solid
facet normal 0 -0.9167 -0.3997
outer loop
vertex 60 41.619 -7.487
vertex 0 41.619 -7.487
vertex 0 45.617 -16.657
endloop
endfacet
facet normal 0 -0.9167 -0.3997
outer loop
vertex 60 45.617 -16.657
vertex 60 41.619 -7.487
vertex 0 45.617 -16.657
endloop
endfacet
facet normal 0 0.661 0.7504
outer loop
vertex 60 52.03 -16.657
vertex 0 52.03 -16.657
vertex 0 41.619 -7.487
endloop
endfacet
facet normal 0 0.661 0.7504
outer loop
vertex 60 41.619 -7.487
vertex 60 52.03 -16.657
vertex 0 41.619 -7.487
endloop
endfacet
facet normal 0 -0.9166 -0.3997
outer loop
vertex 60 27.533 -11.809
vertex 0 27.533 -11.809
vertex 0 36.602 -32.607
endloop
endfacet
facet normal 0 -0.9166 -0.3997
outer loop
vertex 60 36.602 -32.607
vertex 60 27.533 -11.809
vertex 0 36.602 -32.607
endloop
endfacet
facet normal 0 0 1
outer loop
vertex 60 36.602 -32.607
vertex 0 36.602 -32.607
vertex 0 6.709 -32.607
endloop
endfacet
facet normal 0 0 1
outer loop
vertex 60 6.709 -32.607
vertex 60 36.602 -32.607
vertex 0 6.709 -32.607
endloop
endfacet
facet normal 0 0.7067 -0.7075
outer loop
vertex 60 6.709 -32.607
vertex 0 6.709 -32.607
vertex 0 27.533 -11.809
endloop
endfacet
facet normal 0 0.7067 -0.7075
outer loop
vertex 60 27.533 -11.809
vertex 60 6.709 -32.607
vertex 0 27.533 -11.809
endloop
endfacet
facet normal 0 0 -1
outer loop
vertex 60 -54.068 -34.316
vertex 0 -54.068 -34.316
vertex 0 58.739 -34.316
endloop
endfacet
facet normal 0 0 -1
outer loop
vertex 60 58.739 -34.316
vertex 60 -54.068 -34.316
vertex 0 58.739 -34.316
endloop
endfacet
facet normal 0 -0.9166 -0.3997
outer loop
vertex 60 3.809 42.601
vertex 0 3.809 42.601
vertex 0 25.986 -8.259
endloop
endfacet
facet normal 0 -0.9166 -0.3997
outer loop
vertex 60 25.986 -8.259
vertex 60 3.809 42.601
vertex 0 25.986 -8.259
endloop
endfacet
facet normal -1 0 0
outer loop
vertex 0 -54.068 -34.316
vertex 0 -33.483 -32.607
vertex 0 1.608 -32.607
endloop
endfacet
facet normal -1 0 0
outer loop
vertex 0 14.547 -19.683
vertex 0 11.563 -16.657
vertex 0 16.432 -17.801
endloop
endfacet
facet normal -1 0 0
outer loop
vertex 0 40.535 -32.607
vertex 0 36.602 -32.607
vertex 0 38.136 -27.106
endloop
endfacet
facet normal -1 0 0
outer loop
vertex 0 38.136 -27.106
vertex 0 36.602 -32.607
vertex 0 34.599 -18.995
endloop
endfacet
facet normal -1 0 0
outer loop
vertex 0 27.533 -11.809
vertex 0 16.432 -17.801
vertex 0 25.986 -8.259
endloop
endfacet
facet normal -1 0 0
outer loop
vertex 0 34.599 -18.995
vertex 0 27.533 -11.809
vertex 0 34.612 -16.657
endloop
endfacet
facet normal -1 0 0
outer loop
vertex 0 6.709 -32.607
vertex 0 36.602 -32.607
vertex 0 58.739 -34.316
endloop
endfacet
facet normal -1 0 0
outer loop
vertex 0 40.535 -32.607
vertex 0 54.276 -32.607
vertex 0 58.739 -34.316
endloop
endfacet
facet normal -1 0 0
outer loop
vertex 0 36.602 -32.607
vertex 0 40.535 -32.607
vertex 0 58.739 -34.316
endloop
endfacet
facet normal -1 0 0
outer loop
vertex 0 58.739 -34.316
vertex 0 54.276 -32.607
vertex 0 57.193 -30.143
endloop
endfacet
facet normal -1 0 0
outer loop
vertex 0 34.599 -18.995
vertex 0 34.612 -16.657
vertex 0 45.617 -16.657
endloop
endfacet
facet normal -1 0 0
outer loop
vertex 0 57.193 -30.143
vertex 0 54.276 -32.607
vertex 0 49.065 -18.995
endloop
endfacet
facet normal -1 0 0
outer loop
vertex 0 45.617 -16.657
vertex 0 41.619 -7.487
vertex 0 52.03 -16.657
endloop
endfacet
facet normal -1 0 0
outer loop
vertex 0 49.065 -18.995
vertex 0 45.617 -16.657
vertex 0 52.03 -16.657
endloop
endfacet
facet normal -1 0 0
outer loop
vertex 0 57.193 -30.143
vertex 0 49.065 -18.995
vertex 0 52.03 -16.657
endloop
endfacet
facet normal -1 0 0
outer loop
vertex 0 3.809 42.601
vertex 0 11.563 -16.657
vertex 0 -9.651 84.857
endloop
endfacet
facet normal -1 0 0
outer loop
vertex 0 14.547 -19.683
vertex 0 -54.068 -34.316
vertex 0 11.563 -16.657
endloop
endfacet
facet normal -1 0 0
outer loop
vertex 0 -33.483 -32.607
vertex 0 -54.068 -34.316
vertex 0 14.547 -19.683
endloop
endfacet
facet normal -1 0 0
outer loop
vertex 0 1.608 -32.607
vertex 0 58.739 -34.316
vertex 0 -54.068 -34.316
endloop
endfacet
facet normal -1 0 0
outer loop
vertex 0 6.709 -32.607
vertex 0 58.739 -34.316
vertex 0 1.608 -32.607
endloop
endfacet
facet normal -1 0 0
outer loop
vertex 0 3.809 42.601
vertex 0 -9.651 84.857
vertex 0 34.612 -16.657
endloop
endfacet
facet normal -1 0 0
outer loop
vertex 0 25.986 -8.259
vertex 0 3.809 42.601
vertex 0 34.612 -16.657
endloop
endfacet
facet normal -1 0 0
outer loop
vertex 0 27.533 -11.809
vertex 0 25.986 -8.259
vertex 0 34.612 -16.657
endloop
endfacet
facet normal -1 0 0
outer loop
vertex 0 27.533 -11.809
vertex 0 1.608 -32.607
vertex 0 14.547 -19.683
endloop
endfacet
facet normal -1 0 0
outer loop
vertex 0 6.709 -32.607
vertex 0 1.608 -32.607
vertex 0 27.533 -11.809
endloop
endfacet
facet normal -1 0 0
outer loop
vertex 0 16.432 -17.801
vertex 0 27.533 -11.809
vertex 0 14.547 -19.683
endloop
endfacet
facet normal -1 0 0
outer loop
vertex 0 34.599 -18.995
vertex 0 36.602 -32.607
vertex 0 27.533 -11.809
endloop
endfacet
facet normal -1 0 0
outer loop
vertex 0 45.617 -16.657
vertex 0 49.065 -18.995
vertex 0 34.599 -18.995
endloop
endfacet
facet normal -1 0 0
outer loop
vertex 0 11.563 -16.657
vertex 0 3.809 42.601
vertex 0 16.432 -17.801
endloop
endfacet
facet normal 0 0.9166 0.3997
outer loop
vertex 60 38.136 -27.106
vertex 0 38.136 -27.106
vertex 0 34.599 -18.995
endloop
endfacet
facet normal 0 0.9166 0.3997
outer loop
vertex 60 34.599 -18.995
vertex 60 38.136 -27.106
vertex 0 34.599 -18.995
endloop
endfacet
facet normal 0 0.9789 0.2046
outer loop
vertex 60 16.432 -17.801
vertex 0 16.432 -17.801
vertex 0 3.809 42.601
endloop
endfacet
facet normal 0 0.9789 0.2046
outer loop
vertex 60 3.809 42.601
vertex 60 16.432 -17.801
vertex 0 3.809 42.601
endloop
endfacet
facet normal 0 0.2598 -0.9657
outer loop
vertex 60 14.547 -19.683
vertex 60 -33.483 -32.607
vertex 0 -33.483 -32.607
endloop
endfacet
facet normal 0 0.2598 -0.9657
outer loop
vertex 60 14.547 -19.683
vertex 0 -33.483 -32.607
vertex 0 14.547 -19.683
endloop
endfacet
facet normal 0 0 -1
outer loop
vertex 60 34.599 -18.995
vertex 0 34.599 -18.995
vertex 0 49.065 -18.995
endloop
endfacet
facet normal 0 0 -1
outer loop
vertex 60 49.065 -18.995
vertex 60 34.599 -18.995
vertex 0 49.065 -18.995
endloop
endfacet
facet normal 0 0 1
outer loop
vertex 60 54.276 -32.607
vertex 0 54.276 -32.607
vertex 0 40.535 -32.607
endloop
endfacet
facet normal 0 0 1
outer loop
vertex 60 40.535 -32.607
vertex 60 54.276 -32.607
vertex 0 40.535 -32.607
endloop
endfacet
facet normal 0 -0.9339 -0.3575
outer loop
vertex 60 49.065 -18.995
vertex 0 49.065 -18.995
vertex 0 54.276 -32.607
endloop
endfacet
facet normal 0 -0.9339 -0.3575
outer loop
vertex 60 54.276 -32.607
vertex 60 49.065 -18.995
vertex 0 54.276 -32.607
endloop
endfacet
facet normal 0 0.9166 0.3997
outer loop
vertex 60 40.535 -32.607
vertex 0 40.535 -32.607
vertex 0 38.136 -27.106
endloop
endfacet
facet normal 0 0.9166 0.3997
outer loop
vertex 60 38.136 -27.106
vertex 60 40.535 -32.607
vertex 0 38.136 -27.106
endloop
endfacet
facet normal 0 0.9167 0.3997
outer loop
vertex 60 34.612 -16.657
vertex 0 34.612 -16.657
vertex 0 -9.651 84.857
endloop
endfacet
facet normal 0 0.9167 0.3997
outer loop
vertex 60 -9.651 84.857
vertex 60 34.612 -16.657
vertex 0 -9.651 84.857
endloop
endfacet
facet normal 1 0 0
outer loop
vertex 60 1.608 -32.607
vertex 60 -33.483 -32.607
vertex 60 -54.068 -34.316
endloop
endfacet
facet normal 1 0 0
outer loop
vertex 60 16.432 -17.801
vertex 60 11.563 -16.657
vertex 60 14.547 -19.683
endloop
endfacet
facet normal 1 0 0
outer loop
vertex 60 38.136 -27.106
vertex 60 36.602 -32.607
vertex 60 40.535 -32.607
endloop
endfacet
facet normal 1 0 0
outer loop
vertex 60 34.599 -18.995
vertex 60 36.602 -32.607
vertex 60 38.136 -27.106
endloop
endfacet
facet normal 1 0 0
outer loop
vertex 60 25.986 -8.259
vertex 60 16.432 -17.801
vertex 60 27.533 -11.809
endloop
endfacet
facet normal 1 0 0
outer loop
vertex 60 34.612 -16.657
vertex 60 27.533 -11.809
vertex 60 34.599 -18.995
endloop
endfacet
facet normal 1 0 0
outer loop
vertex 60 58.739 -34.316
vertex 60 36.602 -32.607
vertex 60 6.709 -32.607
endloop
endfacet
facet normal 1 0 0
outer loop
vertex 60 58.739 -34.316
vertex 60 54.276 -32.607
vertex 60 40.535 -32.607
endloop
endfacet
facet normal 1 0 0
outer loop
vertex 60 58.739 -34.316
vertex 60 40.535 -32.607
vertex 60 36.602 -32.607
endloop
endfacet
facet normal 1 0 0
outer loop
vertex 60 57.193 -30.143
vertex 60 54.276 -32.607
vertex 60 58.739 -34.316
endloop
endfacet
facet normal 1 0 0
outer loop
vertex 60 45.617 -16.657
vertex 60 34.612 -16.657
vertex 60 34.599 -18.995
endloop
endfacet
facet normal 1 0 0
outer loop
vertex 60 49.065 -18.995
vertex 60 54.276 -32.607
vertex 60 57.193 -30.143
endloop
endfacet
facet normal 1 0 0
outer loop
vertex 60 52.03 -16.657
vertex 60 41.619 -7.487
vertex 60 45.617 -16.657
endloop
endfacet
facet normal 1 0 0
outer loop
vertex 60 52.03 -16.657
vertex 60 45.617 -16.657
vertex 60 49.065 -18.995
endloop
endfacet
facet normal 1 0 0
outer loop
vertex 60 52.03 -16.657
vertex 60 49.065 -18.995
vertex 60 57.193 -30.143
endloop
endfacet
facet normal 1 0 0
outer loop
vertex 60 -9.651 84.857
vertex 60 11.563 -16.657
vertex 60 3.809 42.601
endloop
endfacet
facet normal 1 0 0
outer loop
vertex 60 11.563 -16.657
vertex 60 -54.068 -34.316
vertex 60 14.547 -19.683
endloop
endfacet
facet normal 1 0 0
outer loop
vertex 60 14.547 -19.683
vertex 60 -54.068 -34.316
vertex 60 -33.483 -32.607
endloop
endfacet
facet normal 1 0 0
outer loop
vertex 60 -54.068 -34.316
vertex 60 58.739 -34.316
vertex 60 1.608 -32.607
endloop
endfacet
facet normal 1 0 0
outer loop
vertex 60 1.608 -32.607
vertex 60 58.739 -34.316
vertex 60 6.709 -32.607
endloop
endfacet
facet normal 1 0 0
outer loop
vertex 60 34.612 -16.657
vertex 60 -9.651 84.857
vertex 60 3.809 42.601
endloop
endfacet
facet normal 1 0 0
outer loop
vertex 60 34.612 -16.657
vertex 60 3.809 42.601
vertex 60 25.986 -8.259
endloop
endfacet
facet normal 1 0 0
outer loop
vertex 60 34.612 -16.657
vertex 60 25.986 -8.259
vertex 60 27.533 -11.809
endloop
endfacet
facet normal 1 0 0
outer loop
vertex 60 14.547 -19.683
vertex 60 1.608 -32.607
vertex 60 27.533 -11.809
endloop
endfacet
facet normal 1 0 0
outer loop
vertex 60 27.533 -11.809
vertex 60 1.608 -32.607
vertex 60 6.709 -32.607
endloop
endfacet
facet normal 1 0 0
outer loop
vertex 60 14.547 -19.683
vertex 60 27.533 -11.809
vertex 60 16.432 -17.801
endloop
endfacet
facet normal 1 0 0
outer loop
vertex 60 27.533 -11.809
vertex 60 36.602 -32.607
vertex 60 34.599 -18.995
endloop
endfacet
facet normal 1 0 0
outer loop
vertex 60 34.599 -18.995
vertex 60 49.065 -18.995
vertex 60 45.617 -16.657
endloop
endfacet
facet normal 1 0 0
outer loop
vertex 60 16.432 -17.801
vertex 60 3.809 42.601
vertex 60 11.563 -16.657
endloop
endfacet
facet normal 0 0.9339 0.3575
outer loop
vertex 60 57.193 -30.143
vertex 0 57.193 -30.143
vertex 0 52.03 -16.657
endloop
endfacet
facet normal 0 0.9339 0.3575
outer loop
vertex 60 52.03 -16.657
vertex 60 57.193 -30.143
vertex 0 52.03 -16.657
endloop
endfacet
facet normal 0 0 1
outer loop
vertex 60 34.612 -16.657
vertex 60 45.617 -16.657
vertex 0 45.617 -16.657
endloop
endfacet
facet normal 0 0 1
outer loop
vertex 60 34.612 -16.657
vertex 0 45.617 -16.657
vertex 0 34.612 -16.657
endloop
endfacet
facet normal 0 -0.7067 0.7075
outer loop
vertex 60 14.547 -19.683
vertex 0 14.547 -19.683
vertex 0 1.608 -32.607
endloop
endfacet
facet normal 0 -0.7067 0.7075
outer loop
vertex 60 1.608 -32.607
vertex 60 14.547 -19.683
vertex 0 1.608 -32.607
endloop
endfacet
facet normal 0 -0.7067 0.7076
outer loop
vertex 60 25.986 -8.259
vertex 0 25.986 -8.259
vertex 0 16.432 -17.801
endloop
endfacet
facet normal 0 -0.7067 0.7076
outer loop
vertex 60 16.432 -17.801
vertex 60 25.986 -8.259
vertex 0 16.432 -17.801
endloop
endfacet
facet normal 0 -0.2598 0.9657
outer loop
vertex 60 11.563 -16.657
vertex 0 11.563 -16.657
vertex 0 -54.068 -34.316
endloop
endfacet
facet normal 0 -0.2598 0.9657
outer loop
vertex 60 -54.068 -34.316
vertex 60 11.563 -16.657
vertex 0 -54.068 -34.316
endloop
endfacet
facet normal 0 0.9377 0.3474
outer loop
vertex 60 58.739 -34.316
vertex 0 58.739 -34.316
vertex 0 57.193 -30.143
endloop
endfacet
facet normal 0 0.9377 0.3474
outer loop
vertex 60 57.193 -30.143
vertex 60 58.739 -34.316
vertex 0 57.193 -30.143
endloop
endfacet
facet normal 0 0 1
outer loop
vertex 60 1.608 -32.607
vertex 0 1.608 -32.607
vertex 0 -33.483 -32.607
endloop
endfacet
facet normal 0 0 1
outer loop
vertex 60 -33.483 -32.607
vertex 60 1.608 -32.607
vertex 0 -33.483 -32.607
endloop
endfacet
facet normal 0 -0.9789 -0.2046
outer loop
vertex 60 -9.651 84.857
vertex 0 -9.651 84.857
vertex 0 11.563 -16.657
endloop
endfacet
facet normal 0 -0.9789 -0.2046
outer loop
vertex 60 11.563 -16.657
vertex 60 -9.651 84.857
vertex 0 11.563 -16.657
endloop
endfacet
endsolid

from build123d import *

# Parameters (mm, degrees)
F1_DEPTH = 60


# Not quite as in the source:
# - a feature names something its author has since deleted; it is built from what else it names


with BuildPart() as f1:
    # F0 (on Right) → F1 (new body)
    with BuildSketch(Plane.YZ):
        Polygon((-9.6511039816, 84.8569979519), (11.5631884334, -16.6570162717), (-54.0677122772, -34.3161821365), (58.7390847504, -34.3161821365), (57.1931600571, -30.1430020481), (52.030442059, -16.6570162717), (41.619012037, -7.4873352069), (45.6172674894, -16.6570162717), (45.6120451947, -16.6570162717), (34.6120451947, -16.6570162717), align=None)
        Polygon((-33.4832413232, -32.6066525748), (14.5474322128, -19.683142134), (1.6078982385, -32.6066525748), align=None, mode=Mode.SUBTRACT)
        Polygon((6.7093357808, -32.6066525748), (27.5331988357, -11.8085765279), (36.6017826139, -32.6066525748), align=None, mode=Mode.SUBTRACT)
        Polygon((34.5994135062, -18.9948312665), (45.6120451947, -18.9948312665), (49.0652749053, -18.9948312665), (54.2761653822, -32.6066525748), (40.534575087, -32.6066525748), (38.136206347, -27.1061845124), align=None, mode=Mode.SUBTRACT)
        Polygon((16.4317106992, -17.8011970237), (3.8088566841, 42.6013163841), (25.9855565835, -8.2591820422), align=None, mode=Mode.SUBTRACT)
    extrude(amount=F1_DEPTH)


solid = f1.part
